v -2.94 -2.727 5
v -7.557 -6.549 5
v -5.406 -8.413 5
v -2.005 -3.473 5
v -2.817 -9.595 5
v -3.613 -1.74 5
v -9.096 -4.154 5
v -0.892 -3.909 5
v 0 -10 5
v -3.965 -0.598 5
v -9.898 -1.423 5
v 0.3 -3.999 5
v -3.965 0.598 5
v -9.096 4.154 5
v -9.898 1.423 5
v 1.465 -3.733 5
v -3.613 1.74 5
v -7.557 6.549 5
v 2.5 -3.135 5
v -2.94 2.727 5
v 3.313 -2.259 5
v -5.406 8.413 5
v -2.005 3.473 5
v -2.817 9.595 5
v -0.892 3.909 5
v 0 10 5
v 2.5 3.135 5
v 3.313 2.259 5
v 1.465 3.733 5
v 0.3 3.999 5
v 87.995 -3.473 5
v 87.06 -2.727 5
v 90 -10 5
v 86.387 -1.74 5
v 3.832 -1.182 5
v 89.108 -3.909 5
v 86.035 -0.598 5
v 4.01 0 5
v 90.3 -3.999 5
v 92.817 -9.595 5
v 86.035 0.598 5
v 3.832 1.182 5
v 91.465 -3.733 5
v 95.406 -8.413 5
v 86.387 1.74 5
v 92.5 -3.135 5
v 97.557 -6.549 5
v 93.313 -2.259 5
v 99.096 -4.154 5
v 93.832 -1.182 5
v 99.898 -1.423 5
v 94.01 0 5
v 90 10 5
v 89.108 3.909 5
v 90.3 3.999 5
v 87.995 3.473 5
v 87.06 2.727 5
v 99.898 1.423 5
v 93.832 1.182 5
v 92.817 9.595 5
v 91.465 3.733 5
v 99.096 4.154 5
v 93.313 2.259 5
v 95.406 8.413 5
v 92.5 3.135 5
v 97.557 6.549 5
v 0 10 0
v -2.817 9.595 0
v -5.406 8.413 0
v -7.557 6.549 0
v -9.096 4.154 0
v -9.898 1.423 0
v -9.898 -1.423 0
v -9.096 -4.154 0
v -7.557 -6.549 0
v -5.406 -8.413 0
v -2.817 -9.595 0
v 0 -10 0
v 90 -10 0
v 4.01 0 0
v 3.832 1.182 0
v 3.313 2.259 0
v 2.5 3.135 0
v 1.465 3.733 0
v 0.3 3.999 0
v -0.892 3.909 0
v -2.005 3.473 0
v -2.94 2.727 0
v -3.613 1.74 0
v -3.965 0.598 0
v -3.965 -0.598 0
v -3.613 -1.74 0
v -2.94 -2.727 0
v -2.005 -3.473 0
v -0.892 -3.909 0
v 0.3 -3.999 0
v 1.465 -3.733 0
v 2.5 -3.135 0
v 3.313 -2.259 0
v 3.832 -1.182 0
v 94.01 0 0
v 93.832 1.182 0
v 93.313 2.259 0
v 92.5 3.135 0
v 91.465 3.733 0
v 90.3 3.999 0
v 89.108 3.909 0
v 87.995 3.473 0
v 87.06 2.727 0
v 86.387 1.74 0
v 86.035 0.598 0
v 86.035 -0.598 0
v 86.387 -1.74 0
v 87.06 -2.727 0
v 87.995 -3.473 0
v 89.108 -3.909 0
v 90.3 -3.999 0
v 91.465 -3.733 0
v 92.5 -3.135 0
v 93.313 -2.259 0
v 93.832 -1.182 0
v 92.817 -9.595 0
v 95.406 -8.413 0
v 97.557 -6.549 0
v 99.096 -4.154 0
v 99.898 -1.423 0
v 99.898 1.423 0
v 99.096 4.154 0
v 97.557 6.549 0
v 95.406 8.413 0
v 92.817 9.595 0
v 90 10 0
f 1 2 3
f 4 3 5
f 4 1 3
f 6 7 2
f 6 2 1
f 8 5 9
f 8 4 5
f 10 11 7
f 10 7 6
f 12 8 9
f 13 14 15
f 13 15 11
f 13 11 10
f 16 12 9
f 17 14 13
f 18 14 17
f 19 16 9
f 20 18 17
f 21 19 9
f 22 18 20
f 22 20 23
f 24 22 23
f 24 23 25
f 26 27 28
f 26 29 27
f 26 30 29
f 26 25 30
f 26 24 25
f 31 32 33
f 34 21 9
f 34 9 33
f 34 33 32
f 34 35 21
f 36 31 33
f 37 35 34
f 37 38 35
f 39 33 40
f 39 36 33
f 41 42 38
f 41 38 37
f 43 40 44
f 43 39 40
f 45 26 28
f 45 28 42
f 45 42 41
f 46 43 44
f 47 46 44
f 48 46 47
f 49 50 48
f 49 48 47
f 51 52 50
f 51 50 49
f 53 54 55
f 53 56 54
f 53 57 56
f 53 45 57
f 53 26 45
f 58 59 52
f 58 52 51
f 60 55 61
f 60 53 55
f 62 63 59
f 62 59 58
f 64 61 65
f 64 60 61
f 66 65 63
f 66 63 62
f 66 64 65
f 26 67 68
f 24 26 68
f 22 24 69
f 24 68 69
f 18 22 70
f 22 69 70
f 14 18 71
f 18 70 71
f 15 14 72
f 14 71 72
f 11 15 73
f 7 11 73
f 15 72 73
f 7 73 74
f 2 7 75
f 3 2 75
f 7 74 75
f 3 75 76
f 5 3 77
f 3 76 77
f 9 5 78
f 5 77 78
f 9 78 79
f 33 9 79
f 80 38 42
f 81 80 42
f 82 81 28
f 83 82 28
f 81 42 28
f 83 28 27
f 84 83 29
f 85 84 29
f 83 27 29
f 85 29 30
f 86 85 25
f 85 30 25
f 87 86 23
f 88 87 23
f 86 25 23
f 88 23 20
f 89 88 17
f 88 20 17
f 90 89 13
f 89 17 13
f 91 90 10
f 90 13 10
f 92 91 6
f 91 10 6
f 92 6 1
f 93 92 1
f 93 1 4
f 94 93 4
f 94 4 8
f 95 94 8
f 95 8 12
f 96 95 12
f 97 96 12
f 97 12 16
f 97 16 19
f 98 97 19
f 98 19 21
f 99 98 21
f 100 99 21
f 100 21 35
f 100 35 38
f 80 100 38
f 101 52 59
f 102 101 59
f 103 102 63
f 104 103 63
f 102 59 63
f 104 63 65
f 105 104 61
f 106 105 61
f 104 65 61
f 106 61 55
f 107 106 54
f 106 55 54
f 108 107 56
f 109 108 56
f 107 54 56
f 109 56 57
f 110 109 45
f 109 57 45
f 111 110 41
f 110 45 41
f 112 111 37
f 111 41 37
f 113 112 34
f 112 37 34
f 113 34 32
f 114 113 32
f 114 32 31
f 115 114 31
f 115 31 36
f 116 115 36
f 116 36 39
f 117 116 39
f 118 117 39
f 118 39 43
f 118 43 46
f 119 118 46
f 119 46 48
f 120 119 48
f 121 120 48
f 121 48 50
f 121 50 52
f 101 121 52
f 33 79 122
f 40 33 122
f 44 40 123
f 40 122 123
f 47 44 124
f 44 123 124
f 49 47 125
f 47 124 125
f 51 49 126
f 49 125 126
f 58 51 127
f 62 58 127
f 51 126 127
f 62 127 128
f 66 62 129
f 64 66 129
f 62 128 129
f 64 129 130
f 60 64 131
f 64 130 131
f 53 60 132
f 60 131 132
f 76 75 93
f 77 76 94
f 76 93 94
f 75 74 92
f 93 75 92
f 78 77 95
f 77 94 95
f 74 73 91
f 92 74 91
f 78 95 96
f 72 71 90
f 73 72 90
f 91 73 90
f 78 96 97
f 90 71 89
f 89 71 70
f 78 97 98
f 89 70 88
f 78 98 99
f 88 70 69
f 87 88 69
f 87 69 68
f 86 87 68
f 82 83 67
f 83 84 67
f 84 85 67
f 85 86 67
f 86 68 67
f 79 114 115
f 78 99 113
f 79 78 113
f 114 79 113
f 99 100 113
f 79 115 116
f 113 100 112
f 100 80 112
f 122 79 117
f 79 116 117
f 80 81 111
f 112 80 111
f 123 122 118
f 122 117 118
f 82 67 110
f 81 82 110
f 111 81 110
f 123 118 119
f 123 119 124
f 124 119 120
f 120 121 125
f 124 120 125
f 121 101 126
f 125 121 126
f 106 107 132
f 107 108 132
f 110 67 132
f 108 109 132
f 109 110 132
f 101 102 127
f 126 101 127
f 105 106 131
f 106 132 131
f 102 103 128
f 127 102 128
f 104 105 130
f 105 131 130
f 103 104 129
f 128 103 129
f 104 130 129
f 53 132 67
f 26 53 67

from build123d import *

# Parameters (mm, degrees)
BOSS_EXTRUDE1_DEPTH = 5
SKETCH2_R           = 4.01
CUT_EXTRUDE1_DEPTH  = 10


with BuildPart() as part:
    # Sketch1 → Boss-Extrude1 (new body)
    with BuildSketch(Plane.XY):
        with BuildLine():
            Line((90, 10), (0, 10))
            ThreePointArc((0, 10), (-10, 0), (0, -10))
            Line((0, -10), (90, -10))
            ThreePointArc((90, -10), (100, 0), (90, 10))
        make_face()
    extrude(amount=BOSS_EXTRUDE1_DEPTH)

    # Sketch2 → Cut-Extrude1 (cut)
    with BuildSketch(Plane.XY.offset(5)):
        Circle(SKETCH2_R)
        with Locations((90, 0)):
            Circle(SKETCH2_R)
    extrude(amount=-CUT_EXTRUDE1_DEPTH, mode=Mode.SUBTRACT)


solid = part.part
